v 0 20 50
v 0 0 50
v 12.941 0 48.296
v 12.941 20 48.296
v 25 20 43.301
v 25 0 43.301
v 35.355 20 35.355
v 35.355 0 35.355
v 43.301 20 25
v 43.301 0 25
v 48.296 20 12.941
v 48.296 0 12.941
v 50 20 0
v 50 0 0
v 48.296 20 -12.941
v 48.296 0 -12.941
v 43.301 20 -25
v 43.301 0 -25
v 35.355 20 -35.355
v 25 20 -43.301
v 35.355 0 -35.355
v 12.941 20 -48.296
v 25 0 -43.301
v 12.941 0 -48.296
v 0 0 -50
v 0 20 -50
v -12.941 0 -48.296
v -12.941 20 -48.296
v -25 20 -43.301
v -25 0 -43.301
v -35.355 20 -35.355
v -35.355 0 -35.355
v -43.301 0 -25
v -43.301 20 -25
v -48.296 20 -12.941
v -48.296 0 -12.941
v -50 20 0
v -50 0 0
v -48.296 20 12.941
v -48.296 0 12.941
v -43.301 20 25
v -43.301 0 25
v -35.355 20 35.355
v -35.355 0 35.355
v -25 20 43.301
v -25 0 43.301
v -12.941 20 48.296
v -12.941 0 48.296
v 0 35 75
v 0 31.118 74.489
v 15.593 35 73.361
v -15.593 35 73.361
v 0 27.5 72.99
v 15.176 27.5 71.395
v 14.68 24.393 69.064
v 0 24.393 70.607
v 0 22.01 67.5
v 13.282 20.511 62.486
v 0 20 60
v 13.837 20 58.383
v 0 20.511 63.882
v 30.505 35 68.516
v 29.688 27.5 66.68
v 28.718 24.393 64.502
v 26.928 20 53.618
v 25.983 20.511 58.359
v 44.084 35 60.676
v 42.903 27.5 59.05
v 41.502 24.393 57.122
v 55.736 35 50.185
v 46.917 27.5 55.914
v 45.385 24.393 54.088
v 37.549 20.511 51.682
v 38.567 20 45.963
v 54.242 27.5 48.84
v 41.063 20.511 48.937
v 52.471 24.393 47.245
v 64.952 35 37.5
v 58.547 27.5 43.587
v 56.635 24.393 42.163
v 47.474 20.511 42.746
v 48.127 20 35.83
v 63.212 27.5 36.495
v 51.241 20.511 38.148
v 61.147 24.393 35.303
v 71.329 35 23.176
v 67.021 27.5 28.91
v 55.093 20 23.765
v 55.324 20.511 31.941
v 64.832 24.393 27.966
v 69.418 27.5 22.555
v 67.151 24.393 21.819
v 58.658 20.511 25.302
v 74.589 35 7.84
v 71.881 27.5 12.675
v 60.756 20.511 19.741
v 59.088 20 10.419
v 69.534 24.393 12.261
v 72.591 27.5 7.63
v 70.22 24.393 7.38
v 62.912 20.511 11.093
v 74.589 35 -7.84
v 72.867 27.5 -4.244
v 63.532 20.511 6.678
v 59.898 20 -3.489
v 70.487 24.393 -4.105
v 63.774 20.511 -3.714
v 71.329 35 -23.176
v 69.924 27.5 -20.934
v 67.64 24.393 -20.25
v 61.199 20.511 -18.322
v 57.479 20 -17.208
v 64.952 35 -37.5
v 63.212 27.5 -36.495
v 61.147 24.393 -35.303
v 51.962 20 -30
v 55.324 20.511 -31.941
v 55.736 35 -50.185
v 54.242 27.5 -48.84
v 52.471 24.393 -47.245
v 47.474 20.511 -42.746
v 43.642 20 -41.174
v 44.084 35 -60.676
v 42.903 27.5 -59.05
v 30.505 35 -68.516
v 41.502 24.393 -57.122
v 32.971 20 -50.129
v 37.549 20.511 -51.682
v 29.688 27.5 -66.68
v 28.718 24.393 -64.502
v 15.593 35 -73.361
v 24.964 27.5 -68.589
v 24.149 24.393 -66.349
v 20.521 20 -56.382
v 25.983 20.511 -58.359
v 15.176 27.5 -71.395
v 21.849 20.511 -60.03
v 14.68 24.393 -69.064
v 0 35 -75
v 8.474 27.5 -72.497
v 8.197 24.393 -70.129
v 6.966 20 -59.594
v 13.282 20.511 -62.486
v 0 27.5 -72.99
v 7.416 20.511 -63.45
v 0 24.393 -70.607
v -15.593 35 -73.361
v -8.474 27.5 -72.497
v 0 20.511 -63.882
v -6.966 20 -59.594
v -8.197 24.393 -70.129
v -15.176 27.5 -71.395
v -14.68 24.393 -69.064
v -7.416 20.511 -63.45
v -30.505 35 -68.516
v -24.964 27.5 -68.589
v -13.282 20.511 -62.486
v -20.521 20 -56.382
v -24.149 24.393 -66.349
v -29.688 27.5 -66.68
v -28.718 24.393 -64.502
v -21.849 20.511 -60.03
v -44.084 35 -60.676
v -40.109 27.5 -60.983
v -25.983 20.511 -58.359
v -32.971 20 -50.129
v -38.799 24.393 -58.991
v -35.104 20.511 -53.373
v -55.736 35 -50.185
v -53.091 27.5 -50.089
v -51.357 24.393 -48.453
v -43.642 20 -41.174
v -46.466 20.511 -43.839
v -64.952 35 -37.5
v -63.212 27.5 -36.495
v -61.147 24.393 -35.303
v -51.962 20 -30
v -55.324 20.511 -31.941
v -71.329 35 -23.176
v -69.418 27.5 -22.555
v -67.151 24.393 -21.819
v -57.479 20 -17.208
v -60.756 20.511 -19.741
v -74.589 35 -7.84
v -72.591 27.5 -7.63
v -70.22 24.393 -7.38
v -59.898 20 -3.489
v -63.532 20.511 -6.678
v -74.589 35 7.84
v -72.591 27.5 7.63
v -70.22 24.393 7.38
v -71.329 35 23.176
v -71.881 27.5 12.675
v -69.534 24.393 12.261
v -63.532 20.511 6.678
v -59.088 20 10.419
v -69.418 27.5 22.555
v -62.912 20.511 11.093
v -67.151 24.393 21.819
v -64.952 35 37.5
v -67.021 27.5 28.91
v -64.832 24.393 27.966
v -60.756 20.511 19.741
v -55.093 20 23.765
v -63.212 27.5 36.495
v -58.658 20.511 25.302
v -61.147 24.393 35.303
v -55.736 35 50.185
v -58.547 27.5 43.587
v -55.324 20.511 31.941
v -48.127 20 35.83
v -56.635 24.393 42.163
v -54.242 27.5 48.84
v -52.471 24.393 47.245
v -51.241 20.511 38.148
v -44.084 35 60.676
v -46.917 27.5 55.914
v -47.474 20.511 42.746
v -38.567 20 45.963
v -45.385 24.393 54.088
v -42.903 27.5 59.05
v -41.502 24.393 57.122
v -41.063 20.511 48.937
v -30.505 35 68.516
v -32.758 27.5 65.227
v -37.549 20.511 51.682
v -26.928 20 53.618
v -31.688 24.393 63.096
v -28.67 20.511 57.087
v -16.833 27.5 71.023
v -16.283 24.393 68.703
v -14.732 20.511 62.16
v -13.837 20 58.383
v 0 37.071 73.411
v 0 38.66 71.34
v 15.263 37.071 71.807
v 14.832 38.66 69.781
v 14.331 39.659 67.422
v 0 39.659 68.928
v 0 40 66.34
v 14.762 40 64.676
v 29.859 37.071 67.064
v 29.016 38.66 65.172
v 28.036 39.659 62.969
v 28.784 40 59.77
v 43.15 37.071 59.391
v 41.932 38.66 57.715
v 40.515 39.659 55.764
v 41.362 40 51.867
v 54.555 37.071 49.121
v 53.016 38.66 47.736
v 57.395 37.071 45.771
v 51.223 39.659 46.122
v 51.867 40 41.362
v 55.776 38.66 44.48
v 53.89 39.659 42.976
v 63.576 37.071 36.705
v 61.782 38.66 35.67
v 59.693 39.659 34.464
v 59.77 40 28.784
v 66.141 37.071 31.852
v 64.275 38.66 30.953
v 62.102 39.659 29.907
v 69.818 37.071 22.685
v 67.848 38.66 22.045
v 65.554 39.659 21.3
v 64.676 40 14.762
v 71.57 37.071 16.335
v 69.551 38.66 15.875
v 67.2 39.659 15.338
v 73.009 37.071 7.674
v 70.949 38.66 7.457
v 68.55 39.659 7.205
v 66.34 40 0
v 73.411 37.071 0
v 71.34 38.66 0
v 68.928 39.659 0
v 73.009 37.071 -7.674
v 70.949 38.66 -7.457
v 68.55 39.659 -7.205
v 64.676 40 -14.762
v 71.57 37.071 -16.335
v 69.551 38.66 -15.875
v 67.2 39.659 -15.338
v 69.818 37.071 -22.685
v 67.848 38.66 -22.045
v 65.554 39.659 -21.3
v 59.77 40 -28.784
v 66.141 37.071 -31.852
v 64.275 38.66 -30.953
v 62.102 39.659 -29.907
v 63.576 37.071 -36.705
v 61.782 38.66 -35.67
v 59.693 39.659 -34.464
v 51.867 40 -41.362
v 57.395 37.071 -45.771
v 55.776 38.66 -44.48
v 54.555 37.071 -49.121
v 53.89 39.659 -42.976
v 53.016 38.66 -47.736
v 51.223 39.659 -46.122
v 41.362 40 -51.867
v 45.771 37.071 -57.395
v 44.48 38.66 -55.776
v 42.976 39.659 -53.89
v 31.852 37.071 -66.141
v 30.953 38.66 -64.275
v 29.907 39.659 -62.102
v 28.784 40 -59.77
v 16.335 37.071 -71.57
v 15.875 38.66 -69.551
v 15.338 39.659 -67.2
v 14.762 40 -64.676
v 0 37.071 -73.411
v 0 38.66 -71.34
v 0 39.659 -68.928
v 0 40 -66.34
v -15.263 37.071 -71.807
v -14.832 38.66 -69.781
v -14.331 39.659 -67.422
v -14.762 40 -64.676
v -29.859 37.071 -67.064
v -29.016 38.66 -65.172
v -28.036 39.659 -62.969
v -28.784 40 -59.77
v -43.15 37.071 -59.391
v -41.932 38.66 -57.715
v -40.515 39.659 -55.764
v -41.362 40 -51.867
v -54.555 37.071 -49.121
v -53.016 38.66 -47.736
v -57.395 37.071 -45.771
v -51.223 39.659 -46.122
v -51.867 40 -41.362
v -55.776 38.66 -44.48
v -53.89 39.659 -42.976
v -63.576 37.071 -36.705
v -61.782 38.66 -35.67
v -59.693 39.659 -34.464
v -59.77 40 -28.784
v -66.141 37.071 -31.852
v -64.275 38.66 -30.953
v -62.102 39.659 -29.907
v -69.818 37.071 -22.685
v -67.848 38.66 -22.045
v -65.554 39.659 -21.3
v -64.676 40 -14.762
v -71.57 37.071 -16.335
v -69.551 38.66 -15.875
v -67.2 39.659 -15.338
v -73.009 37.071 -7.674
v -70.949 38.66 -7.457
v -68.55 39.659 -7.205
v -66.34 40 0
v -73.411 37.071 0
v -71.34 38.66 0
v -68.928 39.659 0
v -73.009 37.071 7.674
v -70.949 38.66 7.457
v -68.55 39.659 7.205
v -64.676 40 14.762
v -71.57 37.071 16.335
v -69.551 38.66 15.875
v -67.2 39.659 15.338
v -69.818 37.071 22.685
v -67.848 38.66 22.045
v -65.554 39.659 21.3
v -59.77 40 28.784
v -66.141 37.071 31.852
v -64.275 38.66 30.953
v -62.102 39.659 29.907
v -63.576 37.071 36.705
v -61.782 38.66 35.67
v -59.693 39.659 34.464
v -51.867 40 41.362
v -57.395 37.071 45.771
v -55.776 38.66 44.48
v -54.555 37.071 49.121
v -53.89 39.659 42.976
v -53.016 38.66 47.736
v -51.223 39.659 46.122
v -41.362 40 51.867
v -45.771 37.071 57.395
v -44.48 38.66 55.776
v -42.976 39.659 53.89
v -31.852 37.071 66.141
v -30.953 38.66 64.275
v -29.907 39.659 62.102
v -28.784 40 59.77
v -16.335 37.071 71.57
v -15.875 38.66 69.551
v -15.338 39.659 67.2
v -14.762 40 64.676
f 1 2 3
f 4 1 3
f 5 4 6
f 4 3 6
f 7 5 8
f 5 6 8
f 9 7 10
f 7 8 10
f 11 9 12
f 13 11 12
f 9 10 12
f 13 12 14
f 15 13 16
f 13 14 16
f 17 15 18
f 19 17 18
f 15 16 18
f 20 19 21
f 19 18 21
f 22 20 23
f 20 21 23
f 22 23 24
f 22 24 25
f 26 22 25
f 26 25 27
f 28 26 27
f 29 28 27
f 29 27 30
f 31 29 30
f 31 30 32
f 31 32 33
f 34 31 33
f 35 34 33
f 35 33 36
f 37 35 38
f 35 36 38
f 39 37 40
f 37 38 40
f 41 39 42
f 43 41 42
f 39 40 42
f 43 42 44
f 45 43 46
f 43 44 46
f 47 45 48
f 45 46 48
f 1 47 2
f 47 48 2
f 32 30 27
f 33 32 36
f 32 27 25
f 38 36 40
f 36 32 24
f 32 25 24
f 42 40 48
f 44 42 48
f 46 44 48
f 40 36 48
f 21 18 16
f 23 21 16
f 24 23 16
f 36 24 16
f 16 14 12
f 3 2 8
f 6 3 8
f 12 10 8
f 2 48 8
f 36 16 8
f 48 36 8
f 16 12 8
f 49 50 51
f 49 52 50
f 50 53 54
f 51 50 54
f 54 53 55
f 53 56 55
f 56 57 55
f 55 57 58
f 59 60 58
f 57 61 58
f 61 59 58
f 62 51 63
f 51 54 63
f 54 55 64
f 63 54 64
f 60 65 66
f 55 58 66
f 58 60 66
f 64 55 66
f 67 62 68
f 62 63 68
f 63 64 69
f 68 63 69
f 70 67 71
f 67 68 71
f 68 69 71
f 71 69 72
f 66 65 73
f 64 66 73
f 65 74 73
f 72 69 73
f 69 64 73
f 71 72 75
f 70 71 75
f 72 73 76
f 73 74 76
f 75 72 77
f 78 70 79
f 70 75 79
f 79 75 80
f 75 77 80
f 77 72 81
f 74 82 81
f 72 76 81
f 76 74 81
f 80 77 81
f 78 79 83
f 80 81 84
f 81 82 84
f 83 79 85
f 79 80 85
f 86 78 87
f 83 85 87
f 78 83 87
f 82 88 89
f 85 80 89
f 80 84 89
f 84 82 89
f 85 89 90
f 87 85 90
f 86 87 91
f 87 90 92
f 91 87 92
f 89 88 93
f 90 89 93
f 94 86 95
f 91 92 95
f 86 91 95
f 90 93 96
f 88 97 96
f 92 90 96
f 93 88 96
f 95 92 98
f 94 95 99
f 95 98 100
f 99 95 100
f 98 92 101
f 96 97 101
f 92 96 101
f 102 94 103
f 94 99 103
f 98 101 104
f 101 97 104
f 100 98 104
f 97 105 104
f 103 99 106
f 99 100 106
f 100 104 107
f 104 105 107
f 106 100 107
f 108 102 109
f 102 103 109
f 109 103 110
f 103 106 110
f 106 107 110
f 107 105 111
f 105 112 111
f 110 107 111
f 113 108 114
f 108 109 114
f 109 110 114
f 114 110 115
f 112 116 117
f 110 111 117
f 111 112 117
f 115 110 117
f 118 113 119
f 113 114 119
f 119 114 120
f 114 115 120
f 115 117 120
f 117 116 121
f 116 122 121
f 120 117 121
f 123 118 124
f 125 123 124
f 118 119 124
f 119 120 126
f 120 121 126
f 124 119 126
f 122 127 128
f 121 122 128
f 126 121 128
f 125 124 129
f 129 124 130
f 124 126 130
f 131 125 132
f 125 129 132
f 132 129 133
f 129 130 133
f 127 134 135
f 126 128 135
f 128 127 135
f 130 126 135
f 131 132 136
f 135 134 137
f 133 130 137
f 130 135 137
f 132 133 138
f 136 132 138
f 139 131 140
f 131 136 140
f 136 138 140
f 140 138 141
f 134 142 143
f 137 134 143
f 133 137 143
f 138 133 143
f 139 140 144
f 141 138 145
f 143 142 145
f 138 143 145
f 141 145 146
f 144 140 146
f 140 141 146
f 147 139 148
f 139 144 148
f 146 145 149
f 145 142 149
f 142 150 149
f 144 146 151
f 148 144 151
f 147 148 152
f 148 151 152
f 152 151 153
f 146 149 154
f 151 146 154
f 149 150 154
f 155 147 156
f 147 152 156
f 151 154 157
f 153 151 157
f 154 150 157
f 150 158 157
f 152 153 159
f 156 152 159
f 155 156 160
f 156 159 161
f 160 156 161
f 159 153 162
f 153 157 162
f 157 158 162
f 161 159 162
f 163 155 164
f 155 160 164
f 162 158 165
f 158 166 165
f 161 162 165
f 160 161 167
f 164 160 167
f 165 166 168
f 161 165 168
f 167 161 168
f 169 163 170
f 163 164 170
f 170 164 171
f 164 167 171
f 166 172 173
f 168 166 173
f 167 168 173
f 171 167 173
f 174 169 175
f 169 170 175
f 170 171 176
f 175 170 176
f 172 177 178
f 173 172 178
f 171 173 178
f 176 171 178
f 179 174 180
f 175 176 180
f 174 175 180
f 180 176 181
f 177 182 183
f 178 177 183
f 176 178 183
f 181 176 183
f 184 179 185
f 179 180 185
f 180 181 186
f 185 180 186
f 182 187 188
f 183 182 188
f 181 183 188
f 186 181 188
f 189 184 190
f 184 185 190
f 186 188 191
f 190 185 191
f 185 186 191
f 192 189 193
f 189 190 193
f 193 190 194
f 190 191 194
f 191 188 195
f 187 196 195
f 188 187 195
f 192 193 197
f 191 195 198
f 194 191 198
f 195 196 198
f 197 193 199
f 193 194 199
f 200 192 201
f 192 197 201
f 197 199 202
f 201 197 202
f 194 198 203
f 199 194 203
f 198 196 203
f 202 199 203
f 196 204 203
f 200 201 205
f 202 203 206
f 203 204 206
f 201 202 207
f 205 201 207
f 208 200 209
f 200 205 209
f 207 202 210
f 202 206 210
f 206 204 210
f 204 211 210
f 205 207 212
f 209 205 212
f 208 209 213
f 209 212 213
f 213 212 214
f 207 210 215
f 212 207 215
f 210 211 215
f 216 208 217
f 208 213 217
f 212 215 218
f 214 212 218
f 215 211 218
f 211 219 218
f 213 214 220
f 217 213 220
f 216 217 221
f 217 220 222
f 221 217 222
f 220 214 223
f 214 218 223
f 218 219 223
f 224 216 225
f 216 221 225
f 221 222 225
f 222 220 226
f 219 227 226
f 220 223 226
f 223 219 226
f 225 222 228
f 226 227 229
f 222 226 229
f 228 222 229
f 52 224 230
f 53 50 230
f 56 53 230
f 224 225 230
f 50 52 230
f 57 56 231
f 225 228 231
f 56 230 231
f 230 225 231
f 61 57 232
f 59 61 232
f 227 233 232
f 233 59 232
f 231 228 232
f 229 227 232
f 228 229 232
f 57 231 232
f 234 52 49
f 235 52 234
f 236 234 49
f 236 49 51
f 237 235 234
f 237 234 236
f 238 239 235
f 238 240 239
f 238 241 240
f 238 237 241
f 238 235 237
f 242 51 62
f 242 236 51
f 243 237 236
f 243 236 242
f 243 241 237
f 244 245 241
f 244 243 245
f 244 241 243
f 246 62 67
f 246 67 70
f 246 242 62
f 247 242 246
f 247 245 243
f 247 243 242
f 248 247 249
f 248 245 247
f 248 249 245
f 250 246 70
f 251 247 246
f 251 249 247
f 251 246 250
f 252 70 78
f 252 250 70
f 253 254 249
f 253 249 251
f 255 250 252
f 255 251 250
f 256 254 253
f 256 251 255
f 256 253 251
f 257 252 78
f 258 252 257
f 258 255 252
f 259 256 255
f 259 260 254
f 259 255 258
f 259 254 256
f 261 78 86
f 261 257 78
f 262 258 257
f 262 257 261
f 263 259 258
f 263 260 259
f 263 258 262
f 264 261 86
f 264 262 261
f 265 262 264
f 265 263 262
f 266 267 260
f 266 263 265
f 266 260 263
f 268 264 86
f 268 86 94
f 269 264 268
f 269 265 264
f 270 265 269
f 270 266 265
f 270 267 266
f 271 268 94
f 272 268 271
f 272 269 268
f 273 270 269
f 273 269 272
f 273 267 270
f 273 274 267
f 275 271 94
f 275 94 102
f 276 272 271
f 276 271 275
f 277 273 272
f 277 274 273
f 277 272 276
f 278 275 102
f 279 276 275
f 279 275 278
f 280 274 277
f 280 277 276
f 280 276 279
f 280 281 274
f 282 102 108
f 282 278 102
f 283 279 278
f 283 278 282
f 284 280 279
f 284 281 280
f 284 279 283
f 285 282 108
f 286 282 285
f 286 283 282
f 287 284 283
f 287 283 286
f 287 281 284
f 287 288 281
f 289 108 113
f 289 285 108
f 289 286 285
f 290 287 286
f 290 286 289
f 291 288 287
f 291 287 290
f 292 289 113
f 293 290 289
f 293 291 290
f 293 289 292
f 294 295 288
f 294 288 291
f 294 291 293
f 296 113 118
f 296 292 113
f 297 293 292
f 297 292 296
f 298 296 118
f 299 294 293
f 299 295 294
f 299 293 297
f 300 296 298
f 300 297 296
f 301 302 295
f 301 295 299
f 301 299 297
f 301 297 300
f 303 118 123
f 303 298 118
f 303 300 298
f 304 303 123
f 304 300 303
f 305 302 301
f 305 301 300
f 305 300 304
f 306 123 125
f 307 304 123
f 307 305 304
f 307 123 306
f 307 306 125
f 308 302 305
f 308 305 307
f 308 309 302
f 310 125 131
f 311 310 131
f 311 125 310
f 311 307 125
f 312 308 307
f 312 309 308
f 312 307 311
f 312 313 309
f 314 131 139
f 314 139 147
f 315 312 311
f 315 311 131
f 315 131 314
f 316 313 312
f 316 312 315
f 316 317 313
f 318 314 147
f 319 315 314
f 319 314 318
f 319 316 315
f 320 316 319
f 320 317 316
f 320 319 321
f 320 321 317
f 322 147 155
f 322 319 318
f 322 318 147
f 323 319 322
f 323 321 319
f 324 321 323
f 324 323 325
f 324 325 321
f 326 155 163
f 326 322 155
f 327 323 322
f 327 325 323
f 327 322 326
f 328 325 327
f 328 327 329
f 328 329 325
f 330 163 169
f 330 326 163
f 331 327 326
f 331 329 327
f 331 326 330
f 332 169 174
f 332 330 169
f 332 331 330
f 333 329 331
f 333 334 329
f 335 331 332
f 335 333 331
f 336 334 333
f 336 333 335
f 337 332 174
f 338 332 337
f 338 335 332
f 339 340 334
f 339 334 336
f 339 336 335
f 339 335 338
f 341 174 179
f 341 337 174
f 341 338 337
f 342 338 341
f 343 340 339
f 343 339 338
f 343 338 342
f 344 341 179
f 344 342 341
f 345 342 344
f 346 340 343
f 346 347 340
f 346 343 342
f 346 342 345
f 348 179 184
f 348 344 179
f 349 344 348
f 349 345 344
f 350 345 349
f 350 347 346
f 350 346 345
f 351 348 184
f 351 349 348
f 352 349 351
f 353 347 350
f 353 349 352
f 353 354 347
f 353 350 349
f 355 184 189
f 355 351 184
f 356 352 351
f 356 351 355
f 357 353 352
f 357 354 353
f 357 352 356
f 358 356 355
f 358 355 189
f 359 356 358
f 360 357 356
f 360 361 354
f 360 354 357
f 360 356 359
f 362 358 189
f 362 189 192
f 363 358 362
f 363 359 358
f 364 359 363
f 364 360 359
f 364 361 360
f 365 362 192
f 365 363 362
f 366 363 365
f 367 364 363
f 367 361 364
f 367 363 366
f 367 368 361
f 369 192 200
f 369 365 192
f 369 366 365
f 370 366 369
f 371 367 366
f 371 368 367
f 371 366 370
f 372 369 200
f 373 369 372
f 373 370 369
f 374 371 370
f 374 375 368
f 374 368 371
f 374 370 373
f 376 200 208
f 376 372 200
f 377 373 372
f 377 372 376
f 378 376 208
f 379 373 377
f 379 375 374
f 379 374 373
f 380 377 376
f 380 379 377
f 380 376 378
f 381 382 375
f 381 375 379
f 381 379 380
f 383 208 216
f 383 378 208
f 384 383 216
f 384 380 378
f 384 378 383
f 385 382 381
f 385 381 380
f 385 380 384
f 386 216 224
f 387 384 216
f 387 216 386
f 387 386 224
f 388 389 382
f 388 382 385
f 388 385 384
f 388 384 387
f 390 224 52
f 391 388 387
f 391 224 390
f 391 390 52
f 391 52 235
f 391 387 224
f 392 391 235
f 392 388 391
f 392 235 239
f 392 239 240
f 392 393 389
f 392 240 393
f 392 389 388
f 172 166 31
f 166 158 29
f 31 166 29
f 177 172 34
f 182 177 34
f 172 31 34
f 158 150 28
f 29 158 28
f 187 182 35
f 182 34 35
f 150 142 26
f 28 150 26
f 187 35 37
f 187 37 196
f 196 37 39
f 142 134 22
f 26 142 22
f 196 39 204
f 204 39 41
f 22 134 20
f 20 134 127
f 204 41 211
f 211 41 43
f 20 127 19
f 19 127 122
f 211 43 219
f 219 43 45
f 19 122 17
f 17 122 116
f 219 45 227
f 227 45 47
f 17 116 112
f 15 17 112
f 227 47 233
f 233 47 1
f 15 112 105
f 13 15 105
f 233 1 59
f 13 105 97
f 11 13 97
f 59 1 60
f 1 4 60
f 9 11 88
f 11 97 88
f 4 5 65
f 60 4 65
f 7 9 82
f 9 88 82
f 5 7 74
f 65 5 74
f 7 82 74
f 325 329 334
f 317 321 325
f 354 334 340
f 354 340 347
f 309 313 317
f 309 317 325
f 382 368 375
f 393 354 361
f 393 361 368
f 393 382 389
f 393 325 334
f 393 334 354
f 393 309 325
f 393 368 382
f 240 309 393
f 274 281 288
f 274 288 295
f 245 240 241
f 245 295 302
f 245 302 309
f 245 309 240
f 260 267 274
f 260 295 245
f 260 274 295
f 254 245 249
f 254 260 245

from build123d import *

# Parameters (mm, degrees)
SKETCH1_R           = 50
BOSS_EXTRUDE1_DEPTH = 20
SKETCH2_R           = 75
BOSS_EXTRUDE2_DEPTH = 20
FILLET1_R           = 15
FILLET3_R           = 10


with BuildPart() as part:
    # Sketch1 → Boss-Extrude1 (new body)
    with BuildSketch(Plane(origin=(0, 0, 0), x_dir=(1, 0, 0), z_dir=(0, 1, 0))):
        with Locations(Location((0, 0, 0), (0, 0, 270))):
            Circle(SKETCH1_R)
    extrude(amount=BOSS_EXTRUDE1_DEPTH)

    # Sketch2 → Boss-Extrude2 (add)
    with BuildSketch(Plane(origin=(0, 20, 0), x_dir=(1, 0, 0), z_dir=(0, 1, 0))):
        with Locations(Location((0, 0, 0), (0, 0, 270))):
            Circle(SKETCH2_R)
    extrude(amount=BOSS_EXTRUDE2_DEPTH)

    # Fillet1
    fillet1_edges = [part.edges().sort_by_distance(p)[0] for p in [
        (0, 20, -75),
    ]]
    fillet(fillet1_edges, radius=FILLET1_R)

    # Fillet3
    # the kernel refuses this fillet: 10 mm, written as the material it takes off along each edge
    with BuildSketch(Plane(origin=(0, 40, 0), x_dir=(0, 0, 1), z_dir=(-1, 0, 0))) as fillet3_piece_1:
        with BuildLine():
            CenterArc((66.339745962, -10), FILLET3_R, 30, 60)
            Line((66.339745962, 0), (75, 0))
            Line((75, 0), (75, -5))
        make_face()
    revolve(axis=Axis((0, 40, 0), (0, 1, 0)), mode=Mode.SUBTRACT)


solid = part.part
